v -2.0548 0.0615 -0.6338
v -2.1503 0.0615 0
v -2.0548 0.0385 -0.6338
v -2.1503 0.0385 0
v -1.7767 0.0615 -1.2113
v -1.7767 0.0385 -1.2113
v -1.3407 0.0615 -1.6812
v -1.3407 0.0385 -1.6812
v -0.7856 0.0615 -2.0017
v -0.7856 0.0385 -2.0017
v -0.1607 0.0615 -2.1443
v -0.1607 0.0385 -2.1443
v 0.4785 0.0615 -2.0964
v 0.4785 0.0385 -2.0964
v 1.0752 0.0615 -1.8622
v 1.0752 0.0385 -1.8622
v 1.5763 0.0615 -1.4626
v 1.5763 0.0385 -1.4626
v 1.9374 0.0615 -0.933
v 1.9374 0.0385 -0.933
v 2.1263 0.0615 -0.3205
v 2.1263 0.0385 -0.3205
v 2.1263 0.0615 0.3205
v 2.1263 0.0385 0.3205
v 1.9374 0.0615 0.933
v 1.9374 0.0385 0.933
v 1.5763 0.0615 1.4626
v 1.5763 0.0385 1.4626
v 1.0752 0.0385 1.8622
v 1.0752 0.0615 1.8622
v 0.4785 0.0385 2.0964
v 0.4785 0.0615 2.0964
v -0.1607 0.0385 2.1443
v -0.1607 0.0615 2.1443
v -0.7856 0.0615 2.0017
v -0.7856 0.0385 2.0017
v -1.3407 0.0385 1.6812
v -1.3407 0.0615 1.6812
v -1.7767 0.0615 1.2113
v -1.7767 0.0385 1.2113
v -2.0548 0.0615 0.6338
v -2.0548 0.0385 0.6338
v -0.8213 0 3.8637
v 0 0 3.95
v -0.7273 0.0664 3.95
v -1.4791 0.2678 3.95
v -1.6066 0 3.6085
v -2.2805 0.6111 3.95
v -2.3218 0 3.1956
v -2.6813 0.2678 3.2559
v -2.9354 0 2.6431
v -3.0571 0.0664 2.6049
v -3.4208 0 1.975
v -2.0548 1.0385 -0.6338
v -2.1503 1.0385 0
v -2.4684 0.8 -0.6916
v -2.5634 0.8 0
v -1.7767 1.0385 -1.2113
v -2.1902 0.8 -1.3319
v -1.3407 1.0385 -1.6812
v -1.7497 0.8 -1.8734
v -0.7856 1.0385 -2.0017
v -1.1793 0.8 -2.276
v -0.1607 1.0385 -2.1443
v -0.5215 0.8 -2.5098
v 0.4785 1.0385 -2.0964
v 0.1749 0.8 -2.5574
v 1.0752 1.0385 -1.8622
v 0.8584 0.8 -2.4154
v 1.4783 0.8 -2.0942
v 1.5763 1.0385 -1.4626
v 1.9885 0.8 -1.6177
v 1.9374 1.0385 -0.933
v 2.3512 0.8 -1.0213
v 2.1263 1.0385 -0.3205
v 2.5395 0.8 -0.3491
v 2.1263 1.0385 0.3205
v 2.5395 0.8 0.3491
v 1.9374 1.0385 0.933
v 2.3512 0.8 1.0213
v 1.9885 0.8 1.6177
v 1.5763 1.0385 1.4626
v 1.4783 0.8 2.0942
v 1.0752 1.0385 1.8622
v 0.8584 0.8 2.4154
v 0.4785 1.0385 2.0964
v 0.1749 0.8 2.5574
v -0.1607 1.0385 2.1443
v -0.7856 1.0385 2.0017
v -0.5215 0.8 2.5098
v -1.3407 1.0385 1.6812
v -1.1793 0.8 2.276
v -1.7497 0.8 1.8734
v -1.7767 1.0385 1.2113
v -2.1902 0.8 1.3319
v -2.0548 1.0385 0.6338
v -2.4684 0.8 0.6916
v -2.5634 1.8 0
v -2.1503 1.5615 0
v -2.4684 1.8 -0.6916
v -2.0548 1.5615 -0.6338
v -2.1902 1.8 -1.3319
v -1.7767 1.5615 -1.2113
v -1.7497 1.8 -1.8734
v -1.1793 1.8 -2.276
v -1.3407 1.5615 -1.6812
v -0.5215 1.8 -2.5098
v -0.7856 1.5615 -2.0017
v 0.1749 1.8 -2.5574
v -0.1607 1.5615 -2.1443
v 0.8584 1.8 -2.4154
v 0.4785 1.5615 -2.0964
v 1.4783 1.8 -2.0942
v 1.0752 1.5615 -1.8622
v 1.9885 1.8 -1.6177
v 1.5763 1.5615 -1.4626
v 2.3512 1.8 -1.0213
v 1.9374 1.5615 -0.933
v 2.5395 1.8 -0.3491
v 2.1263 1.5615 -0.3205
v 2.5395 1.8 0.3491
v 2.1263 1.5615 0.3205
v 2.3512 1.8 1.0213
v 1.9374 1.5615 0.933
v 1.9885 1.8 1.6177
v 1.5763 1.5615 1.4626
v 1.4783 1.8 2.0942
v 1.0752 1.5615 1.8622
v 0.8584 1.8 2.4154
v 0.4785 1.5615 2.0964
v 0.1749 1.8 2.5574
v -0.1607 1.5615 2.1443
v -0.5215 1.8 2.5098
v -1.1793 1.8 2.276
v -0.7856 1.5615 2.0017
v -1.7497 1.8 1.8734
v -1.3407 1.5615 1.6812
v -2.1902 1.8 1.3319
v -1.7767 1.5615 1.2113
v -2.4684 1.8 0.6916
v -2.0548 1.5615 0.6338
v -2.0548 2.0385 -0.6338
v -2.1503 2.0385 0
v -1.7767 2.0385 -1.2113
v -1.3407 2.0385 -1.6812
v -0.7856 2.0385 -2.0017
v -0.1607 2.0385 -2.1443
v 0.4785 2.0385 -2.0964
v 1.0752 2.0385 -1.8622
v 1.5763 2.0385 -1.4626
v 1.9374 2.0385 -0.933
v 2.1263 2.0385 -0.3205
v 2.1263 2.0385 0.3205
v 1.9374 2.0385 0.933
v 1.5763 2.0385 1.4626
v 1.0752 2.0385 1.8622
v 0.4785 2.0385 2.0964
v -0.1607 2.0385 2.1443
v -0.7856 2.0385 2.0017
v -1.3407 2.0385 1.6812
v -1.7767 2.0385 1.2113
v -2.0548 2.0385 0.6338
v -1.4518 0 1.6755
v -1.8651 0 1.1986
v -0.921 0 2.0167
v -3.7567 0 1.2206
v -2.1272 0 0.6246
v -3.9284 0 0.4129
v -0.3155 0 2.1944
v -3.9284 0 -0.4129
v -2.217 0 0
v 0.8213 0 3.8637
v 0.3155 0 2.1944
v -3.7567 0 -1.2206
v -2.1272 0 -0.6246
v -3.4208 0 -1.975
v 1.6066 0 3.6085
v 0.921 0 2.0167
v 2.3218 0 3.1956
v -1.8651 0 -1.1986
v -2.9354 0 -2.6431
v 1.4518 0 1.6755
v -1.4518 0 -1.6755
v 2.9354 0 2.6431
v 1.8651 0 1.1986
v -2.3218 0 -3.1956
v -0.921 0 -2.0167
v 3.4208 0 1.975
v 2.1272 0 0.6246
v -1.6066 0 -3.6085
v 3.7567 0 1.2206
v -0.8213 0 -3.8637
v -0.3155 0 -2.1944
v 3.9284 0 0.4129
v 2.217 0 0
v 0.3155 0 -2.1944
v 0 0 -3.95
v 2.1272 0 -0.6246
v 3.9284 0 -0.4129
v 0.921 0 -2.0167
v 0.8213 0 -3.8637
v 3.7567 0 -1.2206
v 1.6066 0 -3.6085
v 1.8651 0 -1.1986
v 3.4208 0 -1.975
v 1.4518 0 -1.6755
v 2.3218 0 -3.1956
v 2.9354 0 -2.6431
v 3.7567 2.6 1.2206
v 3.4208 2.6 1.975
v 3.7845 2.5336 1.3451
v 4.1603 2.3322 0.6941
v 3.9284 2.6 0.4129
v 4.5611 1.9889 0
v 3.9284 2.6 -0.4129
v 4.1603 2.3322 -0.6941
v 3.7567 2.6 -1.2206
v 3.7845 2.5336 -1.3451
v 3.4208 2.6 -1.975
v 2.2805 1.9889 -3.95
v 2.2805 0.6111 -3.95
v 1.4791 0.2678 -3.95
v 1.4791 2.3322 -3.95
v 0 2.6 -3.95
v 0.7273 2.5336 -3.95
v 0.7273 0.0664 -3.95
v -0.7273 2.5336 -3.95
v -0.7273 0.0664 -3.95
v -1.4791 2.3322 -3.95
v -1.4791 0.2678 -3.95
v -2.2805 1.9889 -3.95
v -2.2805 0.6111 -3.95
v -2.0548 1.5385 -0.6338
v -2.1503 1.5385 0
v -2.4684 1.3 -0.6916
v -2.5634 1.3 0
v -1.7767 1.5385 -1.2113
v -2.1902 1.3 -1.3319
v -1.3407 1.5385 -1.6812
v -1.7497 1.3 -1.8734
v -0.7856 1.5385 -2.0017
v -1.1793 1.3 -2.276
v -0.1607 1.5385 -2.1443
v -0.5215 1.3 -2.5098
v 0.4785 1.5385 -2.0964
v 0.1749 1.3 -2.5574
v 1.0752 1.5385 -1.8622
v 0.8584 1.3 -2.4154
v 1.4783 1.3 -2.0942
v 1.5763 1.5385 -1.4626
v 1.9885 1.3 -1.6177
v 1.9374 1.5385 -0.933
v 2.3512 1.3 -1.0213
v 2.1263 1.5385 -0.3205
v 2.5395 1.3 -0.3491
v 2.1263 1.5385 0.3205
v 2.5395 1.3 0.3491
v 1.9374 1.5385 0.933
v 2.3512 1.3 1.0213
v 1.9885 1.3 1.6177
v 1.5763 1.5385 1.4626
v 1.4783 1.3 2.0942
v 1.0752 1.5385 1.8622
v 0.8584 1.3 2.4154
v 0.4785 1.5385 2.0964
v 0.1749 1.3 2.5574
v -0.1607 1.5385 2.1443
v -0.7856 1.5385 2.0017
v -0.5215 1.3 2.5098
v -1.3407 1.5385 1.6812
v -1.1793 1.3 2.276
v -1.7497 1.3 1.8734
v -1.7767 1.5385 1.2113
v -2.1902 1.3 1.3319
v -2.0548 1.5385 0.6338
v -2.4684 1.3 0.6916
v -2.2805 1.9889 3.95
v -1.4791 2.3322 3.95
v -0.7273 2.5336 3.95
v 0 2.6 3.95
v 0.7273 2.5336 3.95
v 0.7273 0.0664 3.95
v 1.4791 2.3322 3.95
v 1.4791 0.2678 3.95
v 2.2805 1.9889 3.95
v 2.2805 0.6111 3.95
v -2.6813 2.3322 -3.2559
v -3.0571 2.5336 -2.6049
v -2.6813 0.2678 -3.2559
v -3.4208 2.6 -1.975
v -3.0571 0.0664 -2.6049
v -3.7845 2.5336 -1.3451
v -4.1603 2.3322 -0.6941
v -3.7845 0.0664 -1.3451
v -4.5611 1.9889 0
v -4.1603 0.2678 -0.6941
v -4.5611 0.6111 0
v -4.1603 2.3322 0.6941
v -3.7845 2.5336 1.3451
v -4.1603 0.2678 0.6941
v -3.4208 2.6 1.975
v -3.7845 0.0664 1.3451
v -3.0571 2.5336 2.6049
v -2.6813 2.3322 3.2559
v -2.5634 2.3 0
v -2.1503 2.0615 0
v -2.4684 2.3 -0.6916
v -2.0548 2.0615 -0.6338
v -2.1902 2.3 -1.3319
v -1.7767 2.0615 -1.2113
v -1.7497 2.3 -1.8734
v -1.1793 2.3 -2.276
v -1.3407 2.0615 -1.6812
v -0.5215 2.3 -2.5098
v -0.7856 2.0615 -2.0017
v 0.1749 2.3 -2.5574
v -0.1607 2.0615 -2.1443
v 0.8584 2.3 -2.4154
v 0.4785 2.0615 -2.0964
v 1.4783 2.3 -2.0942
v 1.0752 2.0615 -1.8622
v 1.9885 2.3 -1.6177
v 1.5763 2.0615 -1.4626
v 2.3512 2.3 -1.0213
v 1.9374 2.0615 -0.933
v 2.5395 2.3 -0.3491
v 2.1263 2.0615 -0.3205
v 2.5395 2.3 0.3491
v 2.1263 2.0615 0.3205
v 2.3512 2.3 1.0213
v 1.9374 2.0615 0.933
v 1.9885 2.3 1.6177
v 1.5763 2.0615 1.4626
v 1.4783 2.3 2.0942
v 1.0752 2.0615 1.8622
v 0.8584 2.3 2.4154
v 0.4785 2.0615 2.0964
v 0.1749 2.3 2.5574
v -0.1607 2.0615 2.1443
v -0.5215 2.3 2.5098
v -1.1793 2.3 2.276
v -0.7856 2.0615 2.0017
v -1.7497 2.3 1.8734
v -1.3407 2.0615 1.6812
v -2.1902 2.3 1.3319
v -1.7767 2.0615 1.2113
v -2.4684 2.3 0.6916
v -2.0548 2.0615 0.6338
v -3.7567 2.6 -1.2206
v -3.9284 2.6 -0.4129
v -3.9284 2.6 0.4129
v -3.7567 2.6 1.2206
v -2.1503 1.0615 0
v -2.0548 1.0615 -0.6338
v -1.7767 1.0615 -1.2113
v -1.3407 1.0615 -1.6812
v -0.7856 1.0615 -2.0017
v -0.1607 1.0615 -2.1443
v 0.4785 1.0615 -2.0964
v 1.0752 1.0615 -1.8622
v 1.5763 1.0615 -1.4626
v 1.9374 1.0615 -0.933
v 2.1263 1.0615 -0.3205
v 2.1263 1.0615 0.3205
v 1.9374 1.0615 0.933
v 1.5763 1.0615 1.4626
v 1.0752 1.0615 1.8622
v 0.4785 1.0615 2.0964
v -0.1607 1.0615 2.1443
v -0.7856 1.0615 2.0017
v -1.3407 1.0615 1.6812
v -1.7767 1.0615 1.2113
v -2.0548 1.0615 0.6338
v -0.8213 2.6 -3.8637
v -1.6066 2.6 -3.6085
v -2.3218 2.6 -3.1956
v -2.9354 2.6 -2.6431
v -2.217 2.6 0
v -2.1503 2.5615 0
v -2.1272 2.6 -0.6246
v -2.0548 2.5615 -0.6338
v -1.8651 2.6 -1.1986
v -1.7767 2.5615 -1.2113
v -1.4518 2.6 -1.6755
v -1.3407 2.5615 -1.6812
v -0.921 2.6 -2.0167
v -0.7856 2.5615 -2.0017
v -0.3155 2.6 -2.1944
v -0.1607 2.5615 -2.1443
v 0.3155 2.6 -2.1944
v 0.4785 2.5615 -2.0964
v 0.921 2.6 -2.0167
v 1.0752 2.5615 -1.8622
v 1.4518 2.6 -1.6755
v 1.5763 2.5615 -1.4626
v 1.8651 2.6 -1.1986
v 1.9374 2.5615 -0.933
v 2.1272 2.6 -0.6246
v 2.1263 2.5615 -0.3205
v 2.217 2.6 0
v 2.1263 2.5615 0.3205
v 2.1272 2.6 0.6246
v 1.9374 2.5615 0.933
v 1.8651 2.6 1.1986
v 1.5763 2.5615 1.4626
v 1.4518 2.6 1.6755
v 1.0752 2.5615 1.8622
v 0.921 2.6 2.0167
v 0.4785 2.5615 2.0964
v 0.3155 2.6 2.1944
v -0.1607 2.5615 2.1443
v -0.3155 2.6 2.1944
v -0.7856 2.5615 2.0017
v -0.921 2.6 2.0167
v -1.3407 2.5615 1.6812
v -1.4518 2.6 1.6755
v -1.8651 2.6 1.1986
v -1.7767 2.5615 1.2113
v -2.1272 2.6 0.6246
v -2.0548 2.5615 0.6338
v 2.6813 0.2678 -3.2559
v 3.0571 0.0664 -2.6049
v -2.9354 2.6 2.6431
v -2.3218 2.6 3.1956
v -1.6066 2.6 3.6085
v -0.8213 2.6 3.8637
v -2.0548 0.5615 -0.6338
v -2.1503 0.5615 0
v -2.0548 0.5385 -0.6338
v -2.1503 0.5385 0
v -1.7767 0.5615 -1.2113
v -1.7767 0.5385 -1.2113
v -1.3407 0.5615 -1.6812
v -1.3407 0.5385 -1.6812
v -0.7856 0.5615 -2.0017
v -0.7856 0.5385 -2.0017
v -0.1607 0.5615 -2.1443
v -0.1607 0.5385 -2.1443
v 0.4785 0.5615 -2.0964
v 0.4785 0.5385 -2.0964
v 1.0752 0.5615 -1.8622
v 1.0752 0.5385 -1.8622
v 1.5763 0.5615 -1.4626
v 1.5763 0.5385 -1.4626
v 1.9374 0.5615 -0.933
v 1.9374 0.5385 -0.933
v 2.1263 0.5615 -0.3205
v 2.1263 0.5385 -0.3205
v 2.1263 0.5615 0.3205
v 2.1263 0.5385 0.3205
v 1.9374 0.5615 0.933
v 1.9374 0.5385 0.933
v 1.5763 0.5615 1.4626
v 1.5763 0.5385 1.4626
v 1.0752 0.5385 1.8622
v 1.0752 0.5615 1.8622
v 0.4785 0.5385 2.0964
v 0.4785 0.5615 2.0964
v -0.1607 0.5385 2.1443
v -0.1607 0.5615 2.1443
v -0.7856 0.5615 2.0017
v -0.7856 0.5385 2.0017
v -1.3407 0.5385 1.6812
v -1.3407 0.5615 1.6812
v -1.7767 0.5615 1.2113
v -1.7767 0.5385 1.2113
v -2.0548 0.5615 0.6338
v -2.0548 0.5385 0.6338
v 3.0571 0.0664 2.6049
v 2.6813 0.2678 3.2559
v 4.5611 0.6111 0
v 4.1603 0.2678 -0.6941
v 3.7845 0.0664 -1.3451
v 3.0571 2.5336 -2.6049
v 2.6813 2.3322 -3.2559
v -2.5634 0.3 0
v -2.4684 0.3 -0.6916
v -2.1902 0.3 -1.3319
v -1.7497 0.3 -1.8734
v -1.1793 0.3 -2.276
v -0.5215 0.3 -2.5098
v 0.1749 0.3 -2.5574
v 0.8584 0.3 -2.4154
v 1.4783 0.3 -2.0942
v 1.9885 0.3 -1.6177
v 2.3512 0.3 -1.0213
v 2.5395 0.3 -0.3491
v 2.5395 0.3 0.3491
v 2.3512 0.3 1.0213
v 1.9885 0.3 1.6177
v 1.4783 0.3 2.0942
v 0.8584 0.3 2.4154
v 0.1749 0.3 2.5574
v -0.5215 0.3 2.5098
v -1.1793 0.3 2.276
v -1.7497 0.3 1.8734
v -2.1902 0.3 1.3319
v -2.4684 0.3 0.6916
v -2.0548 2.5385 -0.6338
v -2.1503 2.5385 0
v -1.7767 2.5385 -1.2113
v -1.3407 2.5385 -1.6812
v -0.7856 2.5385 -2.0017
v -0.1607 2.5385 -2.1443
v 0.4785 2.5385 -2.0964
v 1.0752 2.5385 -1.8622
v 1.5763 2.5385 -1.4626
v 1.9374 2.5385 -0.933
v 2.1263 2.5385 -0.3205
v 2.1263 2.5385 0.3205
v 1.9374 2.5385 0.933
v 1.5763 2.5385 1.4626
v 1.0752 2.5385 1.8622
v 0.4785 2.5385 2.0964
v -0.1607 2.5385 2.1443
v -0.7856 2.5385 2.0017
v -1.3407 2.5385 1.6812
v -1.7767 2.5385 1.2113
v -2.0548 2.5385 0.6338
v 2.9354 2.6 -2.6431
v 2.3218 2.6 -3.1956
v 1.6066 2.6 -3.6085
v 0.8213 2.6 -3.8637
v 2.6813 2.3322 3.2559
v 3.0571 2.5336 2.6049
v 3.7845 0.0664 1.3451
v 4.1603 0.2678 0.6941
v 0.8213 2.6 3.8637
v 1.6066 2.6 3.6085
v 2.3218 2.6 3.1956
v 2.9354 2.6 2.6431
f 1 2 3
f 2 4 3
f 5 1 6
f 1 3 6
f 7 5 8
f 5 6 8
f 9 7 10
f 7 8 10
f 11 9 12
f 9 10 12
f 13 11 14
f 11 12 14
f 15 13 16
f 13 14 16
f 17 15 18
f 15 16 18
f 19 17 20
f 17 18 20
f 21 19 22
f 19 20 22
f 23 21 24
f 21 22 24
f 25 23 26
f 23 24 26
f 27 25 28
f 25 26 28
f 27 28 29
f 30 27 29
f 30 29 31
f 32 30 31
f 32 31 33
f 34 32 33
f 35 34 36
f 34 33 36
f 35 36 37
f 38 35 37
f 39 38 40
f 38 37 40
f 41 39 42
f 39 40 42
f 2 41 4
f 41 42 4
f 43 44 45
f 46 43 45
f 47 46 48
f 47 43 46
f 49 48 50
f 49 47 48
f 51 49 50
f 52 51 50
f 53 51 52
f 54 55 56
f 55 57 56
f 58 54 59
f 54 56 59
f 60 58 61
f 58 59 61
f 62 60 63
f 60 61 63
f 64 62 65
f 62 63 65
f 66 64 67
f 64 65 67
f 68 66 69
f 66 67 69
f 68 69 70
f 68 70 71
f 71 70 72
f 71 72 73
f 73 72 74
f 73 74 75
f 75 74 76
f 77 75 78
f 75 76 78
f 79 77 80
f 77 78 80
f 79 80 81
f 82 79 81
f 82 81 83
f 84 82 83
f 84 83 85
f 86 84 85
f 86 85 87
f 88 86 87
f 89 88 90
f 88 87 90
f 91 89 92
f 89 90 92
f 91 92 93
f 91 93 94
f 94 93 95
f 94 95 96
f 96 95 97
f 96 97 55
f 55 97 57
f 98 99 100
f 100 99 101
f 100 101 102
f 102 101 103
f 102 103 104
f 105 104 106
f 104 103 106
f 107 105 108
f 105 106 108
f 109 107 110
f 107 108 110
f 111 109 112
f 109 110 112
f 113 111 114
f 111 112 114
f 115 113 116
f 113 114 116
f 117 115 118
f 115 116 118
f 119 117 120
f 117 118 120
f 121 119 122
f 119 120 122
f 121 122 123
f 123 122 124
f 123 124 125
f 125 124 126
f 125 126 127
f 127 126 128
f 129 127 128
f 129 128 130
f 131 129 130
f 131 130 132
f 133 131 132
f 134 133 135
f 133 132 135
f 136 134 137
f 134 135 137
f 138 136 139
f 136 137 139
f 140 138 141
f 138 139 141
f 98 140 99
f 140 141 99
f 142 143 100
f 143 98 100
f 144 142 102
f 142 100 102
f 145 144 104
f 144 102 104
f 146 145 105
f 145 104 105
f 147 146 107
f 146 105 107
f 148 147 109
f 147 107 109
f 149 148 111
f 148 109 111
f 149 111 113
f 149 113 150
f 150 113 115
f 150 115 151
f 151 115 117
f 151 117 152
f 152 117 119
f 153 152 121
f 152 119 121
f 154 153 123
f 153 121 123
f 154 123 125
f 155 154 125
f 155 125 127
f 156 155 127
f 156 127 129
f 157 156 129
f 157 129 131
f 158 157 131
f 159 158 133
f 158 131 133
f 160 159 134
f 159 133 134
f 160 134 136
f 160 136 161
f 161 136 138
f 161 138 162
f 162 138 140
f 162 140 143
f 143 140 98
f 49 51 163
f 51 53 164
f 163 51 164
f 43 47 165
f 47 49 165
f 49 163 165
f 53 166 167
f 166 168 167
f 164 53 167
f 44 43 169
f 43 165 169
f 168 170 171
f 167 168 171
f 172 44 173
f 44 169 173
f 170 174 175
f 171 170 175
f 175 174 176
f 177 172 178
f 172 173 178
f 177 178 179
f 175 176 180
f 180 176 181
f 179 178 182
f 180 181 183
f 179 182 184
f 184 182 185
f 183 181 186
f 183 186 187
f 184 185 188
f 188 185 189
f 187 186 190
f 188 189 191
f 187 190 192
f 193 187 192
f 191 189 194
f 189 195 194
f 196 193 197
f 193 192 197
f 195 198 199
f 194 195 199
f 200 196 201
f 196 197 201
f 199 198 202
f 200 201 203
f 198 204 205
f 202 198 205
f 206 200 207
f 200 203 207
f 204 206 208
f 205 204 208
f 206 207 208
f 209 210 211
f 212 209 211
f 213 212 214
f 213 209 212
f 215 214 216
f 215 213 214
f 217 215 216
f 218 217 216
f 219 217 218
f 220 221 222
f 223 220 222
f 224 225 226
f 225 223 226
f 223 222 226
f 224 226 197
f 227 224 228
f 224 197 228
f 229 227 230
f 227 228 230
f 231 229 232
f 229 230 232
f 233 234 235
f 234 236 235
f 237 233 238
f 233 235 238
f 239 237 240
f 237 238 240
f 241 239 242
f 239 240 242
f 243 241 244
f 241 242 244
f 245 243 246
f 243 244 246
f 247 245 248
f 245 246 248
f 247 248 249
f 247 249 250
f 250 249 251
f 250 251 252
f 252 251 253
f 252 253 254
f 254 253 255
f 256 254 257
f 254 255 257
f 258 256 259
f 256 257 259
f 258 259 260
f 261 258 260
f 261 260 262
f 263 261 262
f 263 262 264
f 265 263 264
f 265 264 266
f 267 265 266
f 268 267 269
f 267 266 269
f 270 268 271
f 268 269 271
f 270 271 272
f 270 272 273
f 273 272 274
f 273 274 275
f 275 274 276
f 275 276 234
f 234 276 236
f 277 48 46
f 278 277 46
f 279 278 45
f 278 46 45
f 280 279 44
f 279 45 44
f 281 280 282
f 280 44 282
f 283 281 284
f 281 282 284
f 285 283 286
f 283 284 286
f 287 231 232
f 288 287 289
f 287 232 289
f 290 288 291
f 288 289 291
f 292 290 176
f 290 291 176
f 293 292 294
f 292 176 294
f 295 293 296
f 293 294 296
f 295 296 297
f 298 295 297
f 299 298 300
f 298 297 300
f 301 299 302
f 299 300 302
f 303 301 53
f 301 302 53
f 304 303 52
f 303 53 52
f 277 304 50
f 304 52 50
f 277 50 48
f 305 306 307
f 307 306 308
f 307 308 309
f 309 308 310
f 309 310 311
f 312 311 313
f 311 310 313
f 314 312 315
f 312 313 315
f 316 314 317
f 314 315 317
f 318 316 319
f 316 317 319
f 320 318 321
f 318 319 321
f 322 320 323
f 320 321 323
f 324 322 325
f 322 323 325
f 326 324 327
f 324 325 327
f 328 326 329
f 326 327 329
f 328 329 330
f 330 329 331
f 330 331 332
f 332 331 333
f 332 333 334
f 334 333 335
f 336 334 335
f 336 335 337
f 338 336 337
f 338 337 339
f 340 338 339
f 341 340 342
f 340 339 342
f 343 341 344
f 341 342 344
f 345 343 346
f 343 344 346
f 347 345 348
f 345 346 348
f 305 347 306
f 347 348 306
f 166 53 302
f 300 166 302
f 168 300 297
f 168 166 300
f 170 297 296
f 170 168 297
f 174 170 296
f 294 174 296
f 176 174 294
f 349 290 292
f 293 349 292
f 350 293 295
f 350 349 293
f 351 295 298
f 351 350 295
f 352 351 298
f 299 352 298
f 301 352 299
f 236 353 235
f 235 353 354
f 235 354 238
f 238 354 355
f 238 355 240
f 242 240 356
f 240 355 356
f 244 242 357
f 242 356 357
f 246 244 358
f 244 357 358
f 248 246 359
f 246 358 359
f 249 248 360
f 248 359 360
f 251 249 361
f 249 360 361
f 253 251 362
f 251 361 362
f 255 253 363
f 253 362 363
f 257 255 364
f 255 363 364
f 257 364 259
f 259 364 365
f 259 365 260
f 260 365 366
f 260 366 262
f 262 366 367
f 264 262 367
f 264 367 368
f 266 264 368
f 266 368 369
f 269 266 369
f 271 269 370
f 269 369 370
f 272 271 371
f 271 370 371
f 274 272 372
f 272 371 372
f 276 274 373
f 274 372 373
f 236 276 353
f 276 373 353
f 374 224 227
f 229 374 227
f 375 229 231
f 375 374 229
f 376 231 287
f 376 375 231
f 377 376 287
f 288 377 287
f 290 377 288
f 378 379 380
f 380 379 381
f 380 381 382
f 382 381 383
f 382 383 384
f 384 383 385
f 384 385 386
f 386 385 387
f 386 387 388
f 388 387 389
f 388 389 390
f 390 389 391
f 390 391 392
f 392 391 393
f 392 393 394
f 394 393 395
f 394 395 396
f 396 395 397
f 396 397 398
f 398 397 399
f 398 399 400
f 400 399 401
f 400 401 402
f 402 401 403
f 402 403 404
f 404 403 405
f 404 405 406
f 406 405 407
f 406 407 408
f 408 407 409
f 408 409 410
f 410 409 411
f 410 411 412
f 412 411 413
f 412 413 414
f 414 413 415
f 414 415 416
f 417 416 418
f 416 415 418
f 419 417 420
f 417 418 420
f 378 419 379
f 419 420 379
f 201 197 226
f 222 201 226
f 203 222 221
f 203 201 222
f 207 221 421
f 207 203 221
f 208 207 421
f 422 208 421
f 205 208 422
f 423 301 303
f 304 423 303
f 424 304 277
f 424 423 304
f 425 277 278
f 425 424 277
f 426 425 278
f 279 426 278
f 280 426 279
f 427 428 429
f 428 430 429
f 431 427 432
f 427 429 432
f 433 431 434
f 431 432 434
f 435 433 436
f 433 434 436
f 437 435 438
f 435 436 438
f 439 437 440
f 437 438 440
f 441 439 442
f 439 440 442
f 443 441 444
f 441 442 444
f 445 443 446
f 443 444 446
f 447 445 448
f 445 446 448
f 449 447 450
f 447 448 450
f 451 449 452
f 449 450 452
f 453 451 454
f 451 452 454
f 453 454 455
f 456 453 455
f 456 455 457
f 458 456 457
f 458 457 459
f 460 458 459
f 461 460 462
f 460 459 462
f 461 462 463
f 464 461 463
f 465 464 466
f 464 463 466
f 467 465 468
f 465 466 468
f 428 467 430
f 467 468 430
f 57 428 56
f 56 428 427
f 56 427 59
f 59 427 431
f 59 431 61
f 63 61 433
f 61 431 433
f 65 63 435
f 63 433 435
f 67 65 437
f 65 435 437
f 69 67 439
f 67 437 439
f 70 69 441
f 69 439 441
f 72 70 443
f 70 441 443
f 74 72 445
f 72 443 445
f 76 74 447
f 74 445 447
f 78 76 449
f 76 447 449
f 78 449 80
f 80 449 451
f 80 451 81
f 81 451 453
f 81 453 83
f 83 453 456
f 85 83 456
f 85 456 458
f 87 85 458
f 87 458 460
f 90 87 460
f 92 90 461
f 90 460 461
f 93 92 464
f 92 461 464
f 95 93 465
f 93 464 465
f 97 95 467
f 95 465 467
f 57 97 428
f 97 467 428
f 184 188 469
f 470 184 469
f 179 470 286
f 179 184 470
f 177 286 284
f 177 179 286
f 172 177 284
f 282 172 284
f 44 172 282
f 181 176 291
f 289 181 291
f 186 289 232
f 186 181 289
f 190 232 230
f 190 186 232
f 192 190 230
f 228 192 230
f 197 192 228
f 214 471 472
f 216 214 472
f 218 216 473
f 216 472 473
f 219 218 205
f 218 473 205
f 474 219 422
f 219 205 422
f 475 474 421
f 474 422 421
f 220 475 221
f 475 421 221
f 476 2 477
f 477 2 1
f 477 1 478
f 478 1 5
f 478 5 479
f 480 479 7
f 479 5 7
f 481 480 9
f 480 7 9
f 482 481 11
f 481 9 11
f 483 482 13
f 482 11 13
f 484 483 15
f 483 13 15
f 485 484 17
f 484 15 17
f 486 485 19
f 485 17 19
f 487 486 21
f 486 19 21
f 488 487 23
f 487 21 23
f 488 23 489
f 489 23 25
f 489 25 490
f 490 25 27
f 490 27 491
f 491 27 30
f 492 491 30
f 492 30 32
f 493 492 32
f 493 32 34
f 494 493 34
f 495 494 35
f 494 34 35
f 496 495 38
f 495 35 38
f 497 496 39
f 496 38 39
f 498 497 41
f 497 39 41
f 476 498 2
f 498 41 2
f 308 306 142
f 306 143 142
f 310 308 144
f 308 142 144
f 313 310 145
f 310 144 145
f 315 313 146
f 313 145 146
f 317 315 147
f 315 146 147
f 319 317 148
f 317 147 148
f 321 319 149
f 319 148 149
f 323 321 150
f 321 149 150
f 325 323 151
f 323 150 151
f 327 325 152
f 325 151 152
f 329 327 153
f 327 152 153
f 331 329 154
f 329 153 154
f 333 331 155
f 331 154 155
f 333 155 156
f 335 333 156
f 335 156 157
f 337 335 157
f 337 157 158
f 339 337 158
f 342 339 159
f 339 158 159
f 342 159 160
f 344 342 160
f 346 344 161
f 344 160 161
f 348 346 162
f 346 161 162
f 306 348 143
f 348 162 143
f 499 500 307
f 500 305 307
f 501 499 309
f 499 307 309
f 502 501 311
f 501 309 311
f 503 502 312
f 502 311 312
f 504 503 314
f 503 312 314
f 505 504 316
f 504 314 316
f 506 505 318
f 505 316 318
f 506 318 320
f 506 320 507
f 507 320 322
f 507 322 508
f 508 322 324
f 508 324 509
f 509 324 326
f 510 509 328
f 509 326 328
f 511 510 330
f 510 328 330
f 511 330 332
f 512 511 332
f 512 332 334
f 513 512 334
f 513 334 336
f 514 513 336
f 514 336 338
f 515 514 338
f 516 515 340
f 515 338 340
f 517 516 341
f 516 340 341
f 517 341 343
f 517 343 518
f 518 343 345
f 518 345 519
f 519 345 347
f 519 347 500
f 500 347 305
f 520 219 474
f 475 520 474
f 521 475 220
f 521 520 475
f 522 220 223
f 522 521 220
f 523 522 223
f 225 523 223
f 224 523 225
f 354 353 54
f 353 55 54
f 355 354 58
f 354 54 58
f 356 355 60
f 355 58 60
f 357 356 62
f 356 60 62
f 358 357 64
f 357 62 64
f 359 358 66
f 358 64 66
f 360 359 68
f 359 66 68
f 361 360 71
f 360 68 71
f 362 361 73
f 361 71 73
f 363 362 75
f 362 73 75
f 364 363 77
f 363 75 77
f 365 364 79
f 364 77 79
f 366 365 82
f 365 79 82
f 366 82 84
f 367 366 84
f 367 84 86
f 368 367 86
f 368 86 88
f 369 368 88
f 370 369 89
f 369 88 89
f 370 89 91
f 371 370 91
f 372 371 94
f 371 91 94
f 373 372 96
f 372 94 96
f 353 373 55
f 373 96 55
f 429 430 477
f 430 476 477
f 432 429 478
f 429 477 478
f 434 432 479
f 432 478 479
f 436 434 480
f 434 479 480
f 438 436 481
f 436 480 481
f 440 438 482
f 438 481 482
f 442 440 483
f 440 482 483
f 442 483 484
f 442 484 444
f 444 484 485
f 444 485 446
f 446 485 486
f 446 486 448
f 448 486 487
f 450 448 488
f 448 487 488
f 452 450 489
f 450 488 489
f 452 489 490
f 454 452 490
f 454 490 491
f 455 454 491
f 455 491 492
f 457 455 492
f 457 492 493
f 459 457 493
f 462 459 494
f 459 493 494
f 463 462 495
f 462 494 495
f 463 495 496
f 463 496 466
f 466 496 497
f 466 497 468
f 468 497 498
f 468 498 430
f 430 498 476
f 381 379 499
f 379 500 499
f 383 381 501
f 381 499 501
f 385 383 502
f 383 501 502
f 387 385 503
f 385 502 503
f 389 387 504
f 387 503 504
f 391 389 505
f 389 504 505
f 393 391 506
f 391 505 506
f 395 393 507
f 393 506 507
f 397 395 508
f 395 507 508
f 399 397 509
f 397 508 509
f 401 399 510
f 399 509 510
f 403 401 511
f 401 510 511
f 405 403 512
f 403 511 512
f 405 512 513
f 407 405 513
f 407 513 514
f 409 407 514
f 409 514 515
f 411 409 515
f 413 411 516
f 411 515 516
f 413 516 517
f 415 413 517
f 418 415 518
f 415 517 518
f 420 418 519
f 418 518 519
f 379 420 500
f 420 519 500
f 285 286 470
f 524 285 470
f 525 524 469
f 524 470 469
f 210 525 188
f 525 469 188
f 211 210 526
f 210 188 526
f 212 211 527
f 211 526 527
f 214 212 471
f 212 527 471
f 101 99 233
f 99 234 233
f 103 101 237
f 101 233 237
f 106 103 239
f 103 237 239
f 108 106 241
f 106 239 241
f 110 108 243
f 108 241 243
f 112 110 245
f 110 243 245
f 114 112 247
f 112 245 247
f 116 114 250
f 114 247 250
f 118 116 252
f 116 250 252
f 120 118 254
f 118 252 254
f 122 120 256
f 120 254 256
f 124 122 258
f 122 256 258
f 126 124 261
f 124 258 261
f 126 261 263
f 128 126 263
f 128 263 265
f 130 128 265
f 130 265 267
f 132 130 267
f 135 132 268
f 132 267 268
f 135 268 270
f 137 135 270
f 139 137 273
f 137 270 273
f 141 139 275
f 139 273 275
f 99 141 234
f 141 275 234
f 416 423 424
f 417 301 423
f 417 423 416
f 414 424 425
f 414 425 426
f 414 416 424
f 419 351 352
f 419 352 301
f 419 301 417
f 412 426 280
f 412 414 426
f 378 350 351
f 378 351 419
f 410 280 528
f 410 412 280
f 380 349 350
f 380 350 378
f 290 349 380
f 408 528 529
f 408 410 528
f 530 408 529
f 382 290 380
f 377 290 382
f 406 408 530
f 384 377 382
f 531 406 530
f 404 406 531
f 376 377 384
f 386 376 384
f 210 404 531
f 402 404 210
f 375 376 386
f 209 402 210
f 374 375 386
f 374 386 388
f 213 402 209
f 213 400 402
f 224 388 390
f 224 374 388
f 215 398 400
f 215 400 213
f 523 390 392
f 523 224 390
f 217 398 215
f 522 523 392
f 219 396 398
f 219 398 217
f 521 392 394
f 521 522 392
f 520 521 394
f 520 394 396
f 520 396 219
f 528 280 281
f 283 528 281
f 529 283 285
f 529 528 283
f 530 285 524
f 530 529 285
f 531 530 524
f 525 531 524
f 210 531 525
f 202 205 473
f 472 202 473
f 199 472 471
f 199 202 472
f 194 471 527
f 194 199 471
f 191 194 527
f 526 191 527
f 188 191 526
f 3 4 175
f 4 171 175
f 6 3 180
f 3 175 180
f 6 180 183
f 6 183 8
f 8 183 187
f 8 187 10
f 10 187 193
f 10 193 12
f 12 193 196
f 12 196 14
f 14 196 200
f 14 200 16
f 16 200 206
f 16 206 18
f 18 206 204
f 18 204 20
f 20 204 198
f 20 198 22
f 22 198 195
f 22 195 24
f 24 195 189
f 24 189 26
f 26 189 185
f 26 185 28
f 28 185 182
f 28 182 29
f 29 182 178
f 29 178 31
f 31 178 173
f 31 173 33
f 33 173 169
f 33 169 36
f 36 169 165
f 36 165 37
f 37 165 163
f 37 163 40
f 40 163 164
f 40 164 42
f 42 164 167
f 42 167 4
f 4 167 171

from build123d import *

# Parameters (mm, degrees)
BOSS_EXTRUDE2_DEPTH = 2.6
SKETCH15_OUTSIDE_W  = 18.79
SKETCH15_OUTSIDE_H  = 17.568
SKETCH15_OUTSIDE_R  = 3.95
CUT_EXTRUDE4_DEPTH  = 2.6
CUT_EXTRUDE4_DRAFT  = -45
SKETCH16_OUTSIDE_W  = 18.79
SKETCH16_OUTSIDE_H  = 17.568
SKETCH16_OUTSIDE_R  = 3.95
CUT_EXTRUDE5_DEPTH  = 2.6
CUT_EXTRUDE5_DRAFT  = -45


with BuildPart() as part:
    # Sketch2 → Boss-Extrude2 (new body)
    with BuildSketch(Plane(origin=(0, 0, 0), x_dir=(1, 0, 0), z_dir=(0, 1, 0))):
        Polygon((-4.561067127, 0), (-2.280533563, -3.95), (2.280533563, -3.95), (4.561067127, 0), (2.280533563, 3.95), (-2.280533563, 3.95), align=None)
    extrude(amount=BOSS_EXTRUDE2_DEPTH)

    # Sketch13 → Cut-Revolve1 (revolve, cut)
    with BuildSketch(Plane.XY):
        Polygon((0, 2.6), (2.217, 2.6), (2.150316044, 2.5615), (2.150316044, 2.5385), (2.563410162, 2.3), (2.150316044, 2.0615), (2.150316044, 2.0385), (2.563410162, 1.8), (2.150316044, 1.5615), (2.150316044, 1.5385), (2.563410162, 1.3), (2.150316044, 1.0615), (2.150316044, 1.0385), (2.563410162, 0.8), (2.150316044, 0.5615), (2.150316044, 0.5385), (2.563410162, 0.3), (2.150316044, 0.0615), (2.150316044, 0.0385), (2.217, 0), (0, 0), align=None)
    revolve(axis=Axis((0, 4.352000656, 0), (0, -1, 0)), mode=Mode.SUBTRACT)


with BuildPart() as cut_extrude4_tool:
    # Sketch15 outside → Cut-Extrude4 (with draft: the straight prism first)
    with BuildSketch(Plane(origin=(0, 2.6, 0), x_dir=(1, 0, 0), z_dir=(0, 1, 0))):
        Rectangle(SKETCH15_OUTSIDE_W, SKETCH15_OUTSIDE_H)
        Circle(SKETCH15_OUTSIDE_R, mode=Mode.SUBTRACT)
    extrude(amount=-CUT_EXTRUDE4_DEPTH)
    # Cut-Extrude4: the draft: its side faces are tilted about the plane it starts from
    cut_extrude4_sides = [cut_extrude4_tool.faces().sort_by_distance(p)[0] for p in [
        (0, 1.3, 8.784),
        (9.395, 1.3, 0),
        (0, 1.3, -8.784),
        (-9.395, 1.3, 0),
        (-3.95, 1.3, 0),
    ]]
    draft(cut_extrude4_sides, Plane(origin=(0, 2.6, 0), x_dir=(1, 0, 0), z_dir=(0, 1, 0)), CUT_EXTRUDE4_DRAFT)


with BuildPart() as part_1:
    add(part.part)

    # Cut-Extrude4: cut by cut_extrude4_tool
    add(cut_extrude4_tool.part, mode=Mode.SUBTRACT)


with BuildPart() as cut_extrude5_tool:
    # Sketch16 outside → Cut-Extrude5 (with draft: the straight prism first)
    with BuildSketch(Plane.XZ):
        Rectangle(SKETCH16_OUTSIDE_W, SKETCH16_OUTSIDE_H)
        Circle(SKETCH16_OUTSIDE_R, mode=Mode.SUBTRACT)
    extrude(amount=-CUT_EXTRUDE5_DEPTH)
    # Cut-Extrude5: the draft: its side faces are tilted about the plane it starts from
    cut_extrude5_sides = [cut_extrude5_tool.faces().sort_by_distance(p)[0] for p in [
        (0, 1.3, -8.784),
        (9.395, 1.3, 0),
        (0, 1.3, 8.784),
        (-9.395, 1.3, 0),
        (-3.95, 1.3, 0),
    ]]
    draft(cut_extrude5_sides, Plane.XZ, CUT_EXTRUDE5_DRAFT)


with BuildPart() as part_2:
    add(part_1.part)

    # Cut-Extrude5: cut by cut_extrude5_tool
    add(cut_extrude5_tool.part, mode=Mode.SUBTRACT)


solid = part_2.part
